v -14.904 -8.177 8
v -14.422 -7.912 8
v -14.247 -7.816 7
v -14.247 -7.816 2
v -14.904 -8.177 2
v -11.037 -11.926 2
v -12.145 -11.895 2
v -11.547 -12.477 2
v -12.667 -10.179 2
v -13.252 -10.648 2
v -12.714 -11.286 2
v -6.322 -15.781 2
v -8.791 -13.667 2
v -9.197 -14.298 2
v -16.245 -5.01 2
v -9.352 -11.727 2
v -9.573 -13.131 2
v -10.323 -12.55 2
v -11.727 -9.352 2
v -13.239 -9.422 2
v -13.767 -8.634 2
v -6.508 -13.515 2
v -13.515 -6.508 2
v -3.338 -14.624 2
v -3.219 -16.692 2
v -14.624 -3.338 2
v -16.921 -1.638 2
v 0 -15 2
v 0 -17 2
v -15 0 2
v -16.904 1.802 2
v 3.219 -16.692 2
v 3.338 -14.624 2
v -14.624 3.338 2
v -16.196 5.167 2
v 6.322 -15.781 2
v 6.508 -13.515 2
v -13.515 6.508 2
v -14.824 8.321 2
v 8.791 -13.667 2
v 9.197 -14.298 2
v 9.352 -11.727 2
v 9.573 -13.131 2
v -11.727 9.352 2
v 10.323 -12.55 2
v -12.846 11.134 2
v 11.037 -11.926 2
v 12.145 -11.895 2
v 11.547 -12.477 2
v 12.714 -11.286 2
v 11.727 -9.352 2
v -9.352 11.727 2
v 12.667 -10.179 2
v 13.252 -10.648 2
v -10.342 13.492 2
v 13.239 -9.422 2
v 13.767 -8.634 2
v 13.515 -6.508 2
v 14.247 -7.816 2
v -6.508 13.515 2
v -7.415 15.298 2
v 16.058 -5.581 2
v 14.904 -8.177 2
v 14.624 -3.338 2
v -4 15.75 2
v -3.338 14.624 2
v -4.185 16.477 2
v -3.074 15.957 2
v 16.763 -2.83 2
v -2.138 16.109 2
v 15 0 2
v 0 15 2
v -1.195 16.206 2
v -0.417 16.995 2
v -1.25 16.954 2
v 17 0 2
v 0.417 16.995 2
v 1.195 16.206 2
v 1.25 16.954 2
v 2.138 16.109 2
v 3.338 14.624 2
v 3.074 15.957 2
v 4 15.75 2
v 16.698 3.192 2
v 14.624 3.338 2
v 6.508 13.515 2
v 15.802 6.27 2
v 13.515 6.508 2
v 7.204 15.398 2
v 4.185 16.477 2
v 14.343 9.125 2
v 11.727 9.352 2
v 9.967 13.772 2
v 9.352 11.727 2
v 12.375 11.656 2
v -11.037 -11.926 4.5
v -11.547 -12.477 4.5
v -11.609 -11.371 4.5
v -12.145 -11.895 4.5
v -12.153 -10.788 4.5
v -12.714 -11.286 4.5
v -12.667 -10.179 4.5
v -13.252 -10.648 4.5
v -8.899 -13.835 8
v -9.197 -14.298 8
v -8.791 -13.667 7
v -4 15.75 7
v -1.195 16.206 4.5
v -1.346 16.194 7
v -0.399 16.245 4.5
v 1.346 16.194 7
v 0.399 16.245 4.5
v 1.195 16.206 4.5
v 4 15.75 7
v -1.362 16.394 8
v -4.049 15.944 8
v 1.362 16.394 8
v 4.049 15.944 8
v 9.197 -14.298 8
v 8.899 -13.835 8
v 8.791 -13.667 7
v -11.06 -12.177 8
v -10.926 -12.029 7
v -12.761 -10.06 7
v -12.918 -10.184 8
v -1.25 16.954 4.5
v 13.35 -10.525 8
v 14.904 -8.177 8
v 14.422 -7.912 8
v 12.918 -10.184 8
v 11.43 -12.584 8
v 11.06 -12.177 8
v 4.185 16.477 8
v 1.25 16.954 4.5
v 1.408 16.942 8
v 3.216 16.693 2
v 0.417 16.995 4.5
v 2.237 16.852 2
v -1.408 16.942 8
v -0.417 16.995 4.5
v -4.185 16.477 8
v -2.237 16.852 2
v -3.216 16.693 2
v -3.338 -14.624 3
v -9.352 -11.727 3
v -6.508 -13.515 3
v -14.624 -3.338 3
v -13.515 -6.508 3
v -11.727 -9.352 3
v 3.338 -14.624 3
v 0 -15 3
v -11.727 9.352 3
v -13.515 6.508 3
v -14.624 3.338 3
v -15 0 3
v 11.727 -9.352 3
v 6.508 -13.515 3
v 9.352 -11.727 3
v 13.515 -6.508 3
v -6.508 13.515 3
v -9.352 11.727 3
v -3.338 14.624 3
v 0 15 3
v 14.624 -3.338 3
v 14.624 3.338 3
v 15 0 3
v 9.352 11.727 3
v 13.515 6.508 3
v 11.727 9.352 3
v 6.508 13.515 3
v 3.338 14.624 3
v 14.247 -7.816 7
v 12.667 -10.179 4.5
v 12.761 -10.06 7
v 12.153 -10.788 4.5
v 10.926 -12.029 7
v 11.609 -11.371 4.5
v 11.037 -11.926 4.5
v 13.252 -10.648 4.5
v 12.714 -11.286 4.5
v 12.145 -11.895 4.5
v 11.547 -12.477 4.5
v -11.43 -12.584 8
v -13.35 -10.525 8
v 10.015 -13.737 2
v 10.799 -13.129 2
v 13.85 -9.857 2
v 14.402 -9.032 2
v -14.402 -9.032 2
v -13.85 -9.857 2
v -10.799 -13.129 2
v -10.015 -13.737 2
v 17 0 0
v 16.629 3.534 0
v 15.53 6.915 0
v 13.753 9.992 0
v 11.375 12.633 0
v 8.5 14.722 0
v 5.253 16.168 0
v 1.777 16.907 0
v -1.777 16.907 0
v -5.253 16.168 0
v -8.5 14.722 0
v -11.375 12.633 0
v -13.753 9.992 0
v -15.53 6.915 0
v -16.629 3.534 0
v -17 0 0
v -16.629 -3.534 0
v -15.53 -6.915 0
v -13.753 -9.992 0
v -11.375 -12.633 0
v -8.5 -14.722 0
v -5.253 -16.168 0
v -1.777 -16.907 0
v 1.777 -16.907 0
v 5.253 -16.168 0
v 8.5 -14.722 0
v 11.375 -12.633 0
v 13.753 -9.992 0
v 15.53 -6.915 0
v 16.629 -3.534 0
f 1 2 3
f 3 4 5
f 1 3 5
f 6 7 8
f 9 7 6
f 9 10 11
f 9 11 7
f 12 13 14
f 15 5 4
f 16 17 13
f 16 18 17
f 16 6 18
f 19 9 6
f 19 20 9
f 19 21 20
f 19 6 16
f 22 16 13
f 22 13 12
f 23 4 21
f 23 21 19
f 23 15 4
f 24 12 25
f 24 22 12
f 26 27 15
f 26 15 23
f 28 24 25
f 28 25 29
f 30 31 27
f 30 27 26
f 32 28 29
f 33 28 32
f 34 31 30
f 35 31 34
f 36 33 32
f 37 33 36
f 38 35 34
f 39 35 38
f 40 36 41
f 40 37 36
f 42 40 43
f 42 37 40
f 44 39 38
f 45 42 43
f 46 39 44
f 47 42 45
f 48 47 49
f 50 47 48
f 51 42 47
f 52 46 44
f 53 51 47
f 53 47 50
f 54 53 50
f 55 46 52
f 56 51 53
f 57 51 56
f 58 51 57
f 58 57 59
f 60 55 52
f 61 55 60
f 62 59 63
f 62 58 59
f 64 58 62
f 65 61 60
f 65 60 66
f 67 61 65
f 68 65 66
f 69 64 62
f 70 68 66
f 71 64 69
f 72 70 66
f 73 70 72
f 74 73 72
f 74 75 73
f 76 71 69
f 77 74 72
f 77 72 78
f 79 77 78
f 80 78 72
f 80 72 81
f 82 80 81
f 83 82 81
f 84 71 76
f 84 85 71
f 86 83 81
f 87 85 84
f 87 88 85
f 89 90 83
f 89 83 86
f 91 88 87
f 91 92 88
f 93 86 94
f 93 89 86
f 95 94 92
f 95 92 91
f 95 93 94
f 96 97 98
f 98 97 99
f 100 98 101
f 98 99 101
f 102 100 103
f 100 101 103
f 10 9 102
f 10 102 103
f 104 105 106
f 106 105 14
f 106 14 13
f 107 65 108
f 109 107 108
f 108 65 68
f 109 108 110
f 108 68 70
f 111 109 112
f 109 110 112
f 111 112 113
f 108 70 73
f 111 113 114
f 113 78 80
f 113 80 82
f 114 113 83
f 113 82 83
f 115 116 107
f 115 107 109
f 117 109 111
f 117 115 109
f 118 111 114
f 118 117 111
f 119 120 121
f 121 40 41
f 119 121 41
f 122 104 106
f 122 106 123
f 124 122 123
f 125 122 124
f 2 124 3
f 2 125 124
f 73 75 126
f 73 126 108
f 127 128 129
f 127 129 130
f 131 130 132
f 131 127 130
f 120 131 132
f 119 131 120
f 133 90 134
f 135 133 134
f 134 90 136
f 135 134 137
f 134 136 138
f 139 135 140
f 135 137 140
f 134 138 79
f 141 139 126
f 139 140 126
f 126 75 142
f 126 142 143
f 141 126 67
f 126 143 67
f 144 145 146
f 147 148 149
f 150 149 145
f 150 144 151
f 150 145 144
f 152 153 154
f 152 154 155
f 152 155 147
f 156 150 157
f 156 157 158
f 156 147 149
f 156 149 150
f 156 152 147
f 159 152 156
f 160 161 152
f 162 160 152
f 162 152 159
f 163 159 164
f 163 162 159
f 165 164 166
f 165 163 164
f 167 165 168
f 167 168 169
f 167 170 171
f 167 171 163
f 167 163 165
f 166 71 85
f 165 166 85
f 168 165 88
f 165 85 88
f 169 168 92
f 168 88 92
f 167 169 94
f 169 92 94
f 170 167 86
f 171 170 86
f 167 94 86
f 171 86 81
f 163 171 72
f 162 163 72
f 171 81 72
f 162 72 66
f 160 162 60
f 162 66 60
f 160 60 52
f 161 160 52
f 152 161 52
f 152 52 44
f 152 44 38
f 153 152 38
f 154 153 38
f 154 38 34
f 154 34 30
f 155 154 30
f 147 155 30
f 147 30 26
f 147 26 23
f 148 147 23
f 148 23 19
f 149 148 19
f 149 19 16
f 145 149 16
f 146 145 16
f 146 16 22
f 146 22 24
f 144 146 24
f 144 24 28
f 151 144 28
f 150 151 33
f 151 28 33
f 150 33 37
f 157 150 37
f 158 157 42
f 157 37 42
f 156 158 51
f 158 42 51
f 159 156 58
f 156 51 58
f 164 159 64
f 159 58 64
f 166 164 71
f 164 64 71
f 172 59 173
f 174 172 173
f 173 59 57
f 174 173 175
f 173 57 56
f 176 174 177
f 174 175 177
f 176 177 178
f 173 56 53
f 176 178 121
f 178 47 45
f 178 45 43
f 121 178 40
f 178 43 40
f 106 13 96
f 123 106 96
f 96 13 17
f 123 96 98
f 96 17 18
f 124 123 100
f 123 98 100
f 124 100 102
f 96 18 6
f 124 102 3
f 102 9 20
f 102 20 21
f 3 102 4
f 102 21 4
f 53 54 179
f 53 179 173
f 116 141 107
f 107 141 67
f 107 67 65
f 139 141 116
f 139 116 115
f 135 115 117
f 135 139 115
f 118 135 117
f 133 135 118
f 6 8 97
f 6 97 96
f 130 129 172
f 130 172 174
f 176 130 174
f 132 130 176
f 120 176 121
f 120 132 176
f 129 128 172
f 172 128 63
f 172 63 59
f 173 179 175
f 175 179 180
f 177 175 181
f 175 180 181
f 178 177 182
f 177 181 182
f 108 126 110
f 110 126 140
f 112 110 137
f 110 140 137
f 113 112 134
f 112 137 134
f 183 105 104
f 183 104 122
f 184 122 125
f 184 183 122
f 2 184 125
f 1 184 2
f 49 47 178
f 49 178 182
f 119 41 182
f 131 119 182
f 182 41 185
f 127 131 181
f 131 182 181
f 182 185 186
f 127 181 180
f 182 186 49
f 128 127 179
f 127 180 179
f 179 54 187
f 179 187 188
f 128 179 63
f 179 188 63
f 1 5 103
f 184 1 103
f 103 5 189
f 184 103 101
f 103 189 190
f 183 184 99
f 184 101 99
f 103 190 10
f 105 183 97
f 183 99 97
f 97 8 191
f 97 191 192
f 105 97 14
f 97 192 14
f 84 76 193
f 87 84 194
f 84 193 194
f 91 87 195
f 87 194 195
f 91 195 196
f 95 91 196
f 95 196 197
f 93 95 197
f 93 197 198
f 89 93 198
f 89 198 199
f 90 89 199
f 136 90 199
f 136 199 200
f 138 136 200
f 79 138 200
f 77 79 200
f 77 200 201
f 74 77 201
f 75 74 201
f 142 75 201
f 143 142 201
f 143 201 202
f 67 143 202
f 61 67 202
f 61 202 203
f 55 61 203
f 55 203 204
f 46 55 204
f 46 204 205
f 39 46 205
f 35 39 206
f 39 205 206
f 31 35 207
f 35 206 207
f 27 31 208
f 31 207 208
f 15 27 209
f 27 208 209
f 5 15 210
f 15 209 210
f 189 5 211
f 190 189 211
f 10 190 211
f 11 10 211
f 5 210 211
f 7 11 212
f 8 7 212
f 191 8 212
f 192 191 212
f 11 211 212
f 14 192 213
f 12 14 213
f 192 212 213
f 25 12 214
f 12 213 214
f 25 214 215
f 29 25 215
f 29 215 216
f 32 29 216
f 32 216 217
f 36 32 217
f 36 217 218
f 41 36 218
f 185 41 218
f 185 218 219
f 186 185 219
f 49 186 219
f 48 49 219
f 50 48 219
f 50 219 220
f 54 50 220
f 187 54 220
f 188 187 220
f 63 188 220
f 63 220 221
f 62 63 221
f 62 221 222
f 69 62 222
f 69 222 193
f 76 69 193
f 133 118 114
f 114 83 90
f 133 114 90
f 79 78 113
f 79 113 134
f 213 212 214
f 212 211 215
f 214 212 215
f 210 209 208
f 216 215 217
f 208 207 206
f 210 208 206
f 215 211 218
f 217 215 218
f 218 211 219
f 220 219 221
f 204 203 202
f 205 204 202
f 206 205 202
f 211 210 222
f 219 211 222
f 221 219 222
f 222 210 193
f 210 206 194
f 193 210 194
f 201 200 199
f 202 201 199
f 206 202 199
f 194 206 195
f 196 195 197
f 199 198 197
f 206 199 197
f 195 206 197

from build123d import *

# Parameters (mm, degrees)
SKETCH1_R                                   = 17
SKETCH1_R_2                                 = 15
BOSS_EXTRUDE1_DEPTH                         = 2
SKETCH1_2_R                                 = 15
BOSS_EXTRUDE2_DEPTH                         = 3
BOSS_EXTRUDE3_DEPTH                         = 6
CUT_EXTRUDE1_START                          = -6
CUT_EXTRUDE1_DEPTH                          = 2.5
CHAMFER1_SIZE                               = 1
CHAMFER1_SIZE2                              = 0.2
CIRPATTERN1_COUNT                           = 2
CIRPATTERN1_ANGLE                           = 133
CHAMFER1_OF_CIRPATTERN1_SIZE2               = 0.2
CHAMFER1_OF_CIRPATTERN1_SIZE                = 1
CIRPATTERN1_THE_OTHER_WAY_COUNT             = 2
CIRPATTERN1_THE_OTHER_WAY_ANGLE             = 133
CHAMFER1_OF_CIRPATTERN1_THE_OTHER_WAY_SIZE2 = 0.2
CHAMFER1_OF_CIRPATTERN1_THE_OTHER_WAY_SIZE  = 1


with BuildPart() as part:
    # Sketch1 → Boss-Extrude1 (new body)
    with BuildSketch(Plane.XY):
        Circle(SKETCH1_R)
        Circle(SKETCH1_R_2, mode=Mode.SUBTRACT)
    extrude(amount=BOSS_EXTRUDE1_DEPTH)

    # Sketch1<2> → Boss-Extrude2 (add)
    with BuildSketch(Plane.XY):
        Circle(SKETCH1_2_R)
    extrude(amount=BOSS_EXTRUDE2_DEPTH)

    # Sketch2 → Boss-Extrude3 (add)
    with BuildSketch(Plane.XY.offset(2)):
        with BuildLine():
            ThreePointArc((4.184615385, 16.476923077), (0, 17), (-4.184615385, 16.476923077))
            Line((-4.184615385, 16.476923077), (-4, 15.75))
            ThreePointArc((-4, 15.75), (0, 16.25), (4, 15.75))
            Line((4, 15.75), (4.184615385, 16.476923077))
        make_face()
    boss_extrude3 = extrude(amount=BOSS_EXTRUDE3_DEPTH)

    # Sketch3 → Cut-Extrude1 (cut)
    with BuildSketch(Plane.XY.offset(8).offset(CUT_EXTRUDE1_START)):
        with BuildLine():
            ThreePointArc((1.25, 16.953981833), (0, 17), (-1.25, 16.953981833))
            Line((-1.25, 16.953981833), (-1.194852941, 16.206012046))
            ThreePointArc((-1.194852941, 16.206012046), (0, 16.25), (1.194852941, 16.206012046))
            Line((1.194852941, 16.206012046), (1.25, 16.953981833))
        make_face()
    cut_extrude1 = extrude(amount=CUT_EXTRUDE1_DEPTH, mode=Mode.SUBTRACT)

    # Chamfer1
    chamfer1_edges = [part.edges().sort_by_distance(p)[0] for p in [
        (0, 16.25, 8),
    ]]
    chamfer1_side = [part.faces().sort_by_distance(p)[0] for p in [
        (0, 16.25, 5),
    ]]
    chamfer(chamfer1_edges, length=CHAMFER1_SIZE, length2=CHAMFER1_SIZE2, reference=chamfer1_side[0])

    # CirPattern1: Boss-Extrude3, Cut-Extrude1 ×2 about axis
    cirpattern1_axis = Axis((0, 0, 0), (0, 0, -1))
    for i in range(1, CIRPATTERN1_COUNT):
        add(boss_extrude3.rotate(cirpattern1_axis, i * CIRPATTERN1_ANGLE / (CIRPATTERN1_COUNT - 1)))
        add(cut_extrude1.rotate(cirpattern1_axis, i * CIRPATTERN1_ANGLE / (CIRPATTERN1_COUNT - 1)), mode=Mode.SUBTRACT)

    # Chamfer1 of CirPattern1
    chamfer1_of_cirpattern1_edges = [part.edges().sort_by_distance(p)[0] for p in [
        (11.884497651, -11.082473351, 8),
    ]]
    chamfer(chamfer1_of_cirpattern1_edges, length=CHAMFER1_OF_CIRPATTERN1_SIZE, length2=CHAMFER1_OF_CIRPATTERN1_SIZE2)

    # CirPattern1 the other way: Boss-Extrude3, Cut-Extrude1 ×2 about axis
    cirpattern1_the_other_way_axis = Axis((0, 0, 0), (0, 0, 1))
    for i in range(1, CIRPATTERN1_THE_OTHER_WAY_COUNT):
        add(boss_extrude3.rotate(cirpattern1_the_other_way_axis, i * CIRPATTERN1_THE_OTHER_WAY_ANGLE / (CIRPATTERN1_THE_OTHER_WAY_COUNT - 1)))
        add(cut_extrude1.rotate(cirpattern1_the_other_way_axis, i * CIRPATTERN1_THE_OTHER_WAY_ANGLE / (CIRPATTERN1_THE_OTHER_WAY_COUNT - 1)), mode=Mode.SUBTRACT)

    # Chamfer1 of CirPattern1 the other way
    chamfer1_of_cirpattern1_the_other_way_edges = [part.edges().sort_by_distance(p)[0] for p in [
        (-11.884497651, -11.082473351, 8),
    ]]
    chamfer(chamfer1_of_cirpattern1_the_other_way_edges, length=CHAMFER1_OF_CIRPATTERN1_THE_OTHER_WAY_SIZE, length2=CHAMFER1_OF_CIRPATTERN1_THE_OTHER_WAY_SIZE2)


solid = part.part
